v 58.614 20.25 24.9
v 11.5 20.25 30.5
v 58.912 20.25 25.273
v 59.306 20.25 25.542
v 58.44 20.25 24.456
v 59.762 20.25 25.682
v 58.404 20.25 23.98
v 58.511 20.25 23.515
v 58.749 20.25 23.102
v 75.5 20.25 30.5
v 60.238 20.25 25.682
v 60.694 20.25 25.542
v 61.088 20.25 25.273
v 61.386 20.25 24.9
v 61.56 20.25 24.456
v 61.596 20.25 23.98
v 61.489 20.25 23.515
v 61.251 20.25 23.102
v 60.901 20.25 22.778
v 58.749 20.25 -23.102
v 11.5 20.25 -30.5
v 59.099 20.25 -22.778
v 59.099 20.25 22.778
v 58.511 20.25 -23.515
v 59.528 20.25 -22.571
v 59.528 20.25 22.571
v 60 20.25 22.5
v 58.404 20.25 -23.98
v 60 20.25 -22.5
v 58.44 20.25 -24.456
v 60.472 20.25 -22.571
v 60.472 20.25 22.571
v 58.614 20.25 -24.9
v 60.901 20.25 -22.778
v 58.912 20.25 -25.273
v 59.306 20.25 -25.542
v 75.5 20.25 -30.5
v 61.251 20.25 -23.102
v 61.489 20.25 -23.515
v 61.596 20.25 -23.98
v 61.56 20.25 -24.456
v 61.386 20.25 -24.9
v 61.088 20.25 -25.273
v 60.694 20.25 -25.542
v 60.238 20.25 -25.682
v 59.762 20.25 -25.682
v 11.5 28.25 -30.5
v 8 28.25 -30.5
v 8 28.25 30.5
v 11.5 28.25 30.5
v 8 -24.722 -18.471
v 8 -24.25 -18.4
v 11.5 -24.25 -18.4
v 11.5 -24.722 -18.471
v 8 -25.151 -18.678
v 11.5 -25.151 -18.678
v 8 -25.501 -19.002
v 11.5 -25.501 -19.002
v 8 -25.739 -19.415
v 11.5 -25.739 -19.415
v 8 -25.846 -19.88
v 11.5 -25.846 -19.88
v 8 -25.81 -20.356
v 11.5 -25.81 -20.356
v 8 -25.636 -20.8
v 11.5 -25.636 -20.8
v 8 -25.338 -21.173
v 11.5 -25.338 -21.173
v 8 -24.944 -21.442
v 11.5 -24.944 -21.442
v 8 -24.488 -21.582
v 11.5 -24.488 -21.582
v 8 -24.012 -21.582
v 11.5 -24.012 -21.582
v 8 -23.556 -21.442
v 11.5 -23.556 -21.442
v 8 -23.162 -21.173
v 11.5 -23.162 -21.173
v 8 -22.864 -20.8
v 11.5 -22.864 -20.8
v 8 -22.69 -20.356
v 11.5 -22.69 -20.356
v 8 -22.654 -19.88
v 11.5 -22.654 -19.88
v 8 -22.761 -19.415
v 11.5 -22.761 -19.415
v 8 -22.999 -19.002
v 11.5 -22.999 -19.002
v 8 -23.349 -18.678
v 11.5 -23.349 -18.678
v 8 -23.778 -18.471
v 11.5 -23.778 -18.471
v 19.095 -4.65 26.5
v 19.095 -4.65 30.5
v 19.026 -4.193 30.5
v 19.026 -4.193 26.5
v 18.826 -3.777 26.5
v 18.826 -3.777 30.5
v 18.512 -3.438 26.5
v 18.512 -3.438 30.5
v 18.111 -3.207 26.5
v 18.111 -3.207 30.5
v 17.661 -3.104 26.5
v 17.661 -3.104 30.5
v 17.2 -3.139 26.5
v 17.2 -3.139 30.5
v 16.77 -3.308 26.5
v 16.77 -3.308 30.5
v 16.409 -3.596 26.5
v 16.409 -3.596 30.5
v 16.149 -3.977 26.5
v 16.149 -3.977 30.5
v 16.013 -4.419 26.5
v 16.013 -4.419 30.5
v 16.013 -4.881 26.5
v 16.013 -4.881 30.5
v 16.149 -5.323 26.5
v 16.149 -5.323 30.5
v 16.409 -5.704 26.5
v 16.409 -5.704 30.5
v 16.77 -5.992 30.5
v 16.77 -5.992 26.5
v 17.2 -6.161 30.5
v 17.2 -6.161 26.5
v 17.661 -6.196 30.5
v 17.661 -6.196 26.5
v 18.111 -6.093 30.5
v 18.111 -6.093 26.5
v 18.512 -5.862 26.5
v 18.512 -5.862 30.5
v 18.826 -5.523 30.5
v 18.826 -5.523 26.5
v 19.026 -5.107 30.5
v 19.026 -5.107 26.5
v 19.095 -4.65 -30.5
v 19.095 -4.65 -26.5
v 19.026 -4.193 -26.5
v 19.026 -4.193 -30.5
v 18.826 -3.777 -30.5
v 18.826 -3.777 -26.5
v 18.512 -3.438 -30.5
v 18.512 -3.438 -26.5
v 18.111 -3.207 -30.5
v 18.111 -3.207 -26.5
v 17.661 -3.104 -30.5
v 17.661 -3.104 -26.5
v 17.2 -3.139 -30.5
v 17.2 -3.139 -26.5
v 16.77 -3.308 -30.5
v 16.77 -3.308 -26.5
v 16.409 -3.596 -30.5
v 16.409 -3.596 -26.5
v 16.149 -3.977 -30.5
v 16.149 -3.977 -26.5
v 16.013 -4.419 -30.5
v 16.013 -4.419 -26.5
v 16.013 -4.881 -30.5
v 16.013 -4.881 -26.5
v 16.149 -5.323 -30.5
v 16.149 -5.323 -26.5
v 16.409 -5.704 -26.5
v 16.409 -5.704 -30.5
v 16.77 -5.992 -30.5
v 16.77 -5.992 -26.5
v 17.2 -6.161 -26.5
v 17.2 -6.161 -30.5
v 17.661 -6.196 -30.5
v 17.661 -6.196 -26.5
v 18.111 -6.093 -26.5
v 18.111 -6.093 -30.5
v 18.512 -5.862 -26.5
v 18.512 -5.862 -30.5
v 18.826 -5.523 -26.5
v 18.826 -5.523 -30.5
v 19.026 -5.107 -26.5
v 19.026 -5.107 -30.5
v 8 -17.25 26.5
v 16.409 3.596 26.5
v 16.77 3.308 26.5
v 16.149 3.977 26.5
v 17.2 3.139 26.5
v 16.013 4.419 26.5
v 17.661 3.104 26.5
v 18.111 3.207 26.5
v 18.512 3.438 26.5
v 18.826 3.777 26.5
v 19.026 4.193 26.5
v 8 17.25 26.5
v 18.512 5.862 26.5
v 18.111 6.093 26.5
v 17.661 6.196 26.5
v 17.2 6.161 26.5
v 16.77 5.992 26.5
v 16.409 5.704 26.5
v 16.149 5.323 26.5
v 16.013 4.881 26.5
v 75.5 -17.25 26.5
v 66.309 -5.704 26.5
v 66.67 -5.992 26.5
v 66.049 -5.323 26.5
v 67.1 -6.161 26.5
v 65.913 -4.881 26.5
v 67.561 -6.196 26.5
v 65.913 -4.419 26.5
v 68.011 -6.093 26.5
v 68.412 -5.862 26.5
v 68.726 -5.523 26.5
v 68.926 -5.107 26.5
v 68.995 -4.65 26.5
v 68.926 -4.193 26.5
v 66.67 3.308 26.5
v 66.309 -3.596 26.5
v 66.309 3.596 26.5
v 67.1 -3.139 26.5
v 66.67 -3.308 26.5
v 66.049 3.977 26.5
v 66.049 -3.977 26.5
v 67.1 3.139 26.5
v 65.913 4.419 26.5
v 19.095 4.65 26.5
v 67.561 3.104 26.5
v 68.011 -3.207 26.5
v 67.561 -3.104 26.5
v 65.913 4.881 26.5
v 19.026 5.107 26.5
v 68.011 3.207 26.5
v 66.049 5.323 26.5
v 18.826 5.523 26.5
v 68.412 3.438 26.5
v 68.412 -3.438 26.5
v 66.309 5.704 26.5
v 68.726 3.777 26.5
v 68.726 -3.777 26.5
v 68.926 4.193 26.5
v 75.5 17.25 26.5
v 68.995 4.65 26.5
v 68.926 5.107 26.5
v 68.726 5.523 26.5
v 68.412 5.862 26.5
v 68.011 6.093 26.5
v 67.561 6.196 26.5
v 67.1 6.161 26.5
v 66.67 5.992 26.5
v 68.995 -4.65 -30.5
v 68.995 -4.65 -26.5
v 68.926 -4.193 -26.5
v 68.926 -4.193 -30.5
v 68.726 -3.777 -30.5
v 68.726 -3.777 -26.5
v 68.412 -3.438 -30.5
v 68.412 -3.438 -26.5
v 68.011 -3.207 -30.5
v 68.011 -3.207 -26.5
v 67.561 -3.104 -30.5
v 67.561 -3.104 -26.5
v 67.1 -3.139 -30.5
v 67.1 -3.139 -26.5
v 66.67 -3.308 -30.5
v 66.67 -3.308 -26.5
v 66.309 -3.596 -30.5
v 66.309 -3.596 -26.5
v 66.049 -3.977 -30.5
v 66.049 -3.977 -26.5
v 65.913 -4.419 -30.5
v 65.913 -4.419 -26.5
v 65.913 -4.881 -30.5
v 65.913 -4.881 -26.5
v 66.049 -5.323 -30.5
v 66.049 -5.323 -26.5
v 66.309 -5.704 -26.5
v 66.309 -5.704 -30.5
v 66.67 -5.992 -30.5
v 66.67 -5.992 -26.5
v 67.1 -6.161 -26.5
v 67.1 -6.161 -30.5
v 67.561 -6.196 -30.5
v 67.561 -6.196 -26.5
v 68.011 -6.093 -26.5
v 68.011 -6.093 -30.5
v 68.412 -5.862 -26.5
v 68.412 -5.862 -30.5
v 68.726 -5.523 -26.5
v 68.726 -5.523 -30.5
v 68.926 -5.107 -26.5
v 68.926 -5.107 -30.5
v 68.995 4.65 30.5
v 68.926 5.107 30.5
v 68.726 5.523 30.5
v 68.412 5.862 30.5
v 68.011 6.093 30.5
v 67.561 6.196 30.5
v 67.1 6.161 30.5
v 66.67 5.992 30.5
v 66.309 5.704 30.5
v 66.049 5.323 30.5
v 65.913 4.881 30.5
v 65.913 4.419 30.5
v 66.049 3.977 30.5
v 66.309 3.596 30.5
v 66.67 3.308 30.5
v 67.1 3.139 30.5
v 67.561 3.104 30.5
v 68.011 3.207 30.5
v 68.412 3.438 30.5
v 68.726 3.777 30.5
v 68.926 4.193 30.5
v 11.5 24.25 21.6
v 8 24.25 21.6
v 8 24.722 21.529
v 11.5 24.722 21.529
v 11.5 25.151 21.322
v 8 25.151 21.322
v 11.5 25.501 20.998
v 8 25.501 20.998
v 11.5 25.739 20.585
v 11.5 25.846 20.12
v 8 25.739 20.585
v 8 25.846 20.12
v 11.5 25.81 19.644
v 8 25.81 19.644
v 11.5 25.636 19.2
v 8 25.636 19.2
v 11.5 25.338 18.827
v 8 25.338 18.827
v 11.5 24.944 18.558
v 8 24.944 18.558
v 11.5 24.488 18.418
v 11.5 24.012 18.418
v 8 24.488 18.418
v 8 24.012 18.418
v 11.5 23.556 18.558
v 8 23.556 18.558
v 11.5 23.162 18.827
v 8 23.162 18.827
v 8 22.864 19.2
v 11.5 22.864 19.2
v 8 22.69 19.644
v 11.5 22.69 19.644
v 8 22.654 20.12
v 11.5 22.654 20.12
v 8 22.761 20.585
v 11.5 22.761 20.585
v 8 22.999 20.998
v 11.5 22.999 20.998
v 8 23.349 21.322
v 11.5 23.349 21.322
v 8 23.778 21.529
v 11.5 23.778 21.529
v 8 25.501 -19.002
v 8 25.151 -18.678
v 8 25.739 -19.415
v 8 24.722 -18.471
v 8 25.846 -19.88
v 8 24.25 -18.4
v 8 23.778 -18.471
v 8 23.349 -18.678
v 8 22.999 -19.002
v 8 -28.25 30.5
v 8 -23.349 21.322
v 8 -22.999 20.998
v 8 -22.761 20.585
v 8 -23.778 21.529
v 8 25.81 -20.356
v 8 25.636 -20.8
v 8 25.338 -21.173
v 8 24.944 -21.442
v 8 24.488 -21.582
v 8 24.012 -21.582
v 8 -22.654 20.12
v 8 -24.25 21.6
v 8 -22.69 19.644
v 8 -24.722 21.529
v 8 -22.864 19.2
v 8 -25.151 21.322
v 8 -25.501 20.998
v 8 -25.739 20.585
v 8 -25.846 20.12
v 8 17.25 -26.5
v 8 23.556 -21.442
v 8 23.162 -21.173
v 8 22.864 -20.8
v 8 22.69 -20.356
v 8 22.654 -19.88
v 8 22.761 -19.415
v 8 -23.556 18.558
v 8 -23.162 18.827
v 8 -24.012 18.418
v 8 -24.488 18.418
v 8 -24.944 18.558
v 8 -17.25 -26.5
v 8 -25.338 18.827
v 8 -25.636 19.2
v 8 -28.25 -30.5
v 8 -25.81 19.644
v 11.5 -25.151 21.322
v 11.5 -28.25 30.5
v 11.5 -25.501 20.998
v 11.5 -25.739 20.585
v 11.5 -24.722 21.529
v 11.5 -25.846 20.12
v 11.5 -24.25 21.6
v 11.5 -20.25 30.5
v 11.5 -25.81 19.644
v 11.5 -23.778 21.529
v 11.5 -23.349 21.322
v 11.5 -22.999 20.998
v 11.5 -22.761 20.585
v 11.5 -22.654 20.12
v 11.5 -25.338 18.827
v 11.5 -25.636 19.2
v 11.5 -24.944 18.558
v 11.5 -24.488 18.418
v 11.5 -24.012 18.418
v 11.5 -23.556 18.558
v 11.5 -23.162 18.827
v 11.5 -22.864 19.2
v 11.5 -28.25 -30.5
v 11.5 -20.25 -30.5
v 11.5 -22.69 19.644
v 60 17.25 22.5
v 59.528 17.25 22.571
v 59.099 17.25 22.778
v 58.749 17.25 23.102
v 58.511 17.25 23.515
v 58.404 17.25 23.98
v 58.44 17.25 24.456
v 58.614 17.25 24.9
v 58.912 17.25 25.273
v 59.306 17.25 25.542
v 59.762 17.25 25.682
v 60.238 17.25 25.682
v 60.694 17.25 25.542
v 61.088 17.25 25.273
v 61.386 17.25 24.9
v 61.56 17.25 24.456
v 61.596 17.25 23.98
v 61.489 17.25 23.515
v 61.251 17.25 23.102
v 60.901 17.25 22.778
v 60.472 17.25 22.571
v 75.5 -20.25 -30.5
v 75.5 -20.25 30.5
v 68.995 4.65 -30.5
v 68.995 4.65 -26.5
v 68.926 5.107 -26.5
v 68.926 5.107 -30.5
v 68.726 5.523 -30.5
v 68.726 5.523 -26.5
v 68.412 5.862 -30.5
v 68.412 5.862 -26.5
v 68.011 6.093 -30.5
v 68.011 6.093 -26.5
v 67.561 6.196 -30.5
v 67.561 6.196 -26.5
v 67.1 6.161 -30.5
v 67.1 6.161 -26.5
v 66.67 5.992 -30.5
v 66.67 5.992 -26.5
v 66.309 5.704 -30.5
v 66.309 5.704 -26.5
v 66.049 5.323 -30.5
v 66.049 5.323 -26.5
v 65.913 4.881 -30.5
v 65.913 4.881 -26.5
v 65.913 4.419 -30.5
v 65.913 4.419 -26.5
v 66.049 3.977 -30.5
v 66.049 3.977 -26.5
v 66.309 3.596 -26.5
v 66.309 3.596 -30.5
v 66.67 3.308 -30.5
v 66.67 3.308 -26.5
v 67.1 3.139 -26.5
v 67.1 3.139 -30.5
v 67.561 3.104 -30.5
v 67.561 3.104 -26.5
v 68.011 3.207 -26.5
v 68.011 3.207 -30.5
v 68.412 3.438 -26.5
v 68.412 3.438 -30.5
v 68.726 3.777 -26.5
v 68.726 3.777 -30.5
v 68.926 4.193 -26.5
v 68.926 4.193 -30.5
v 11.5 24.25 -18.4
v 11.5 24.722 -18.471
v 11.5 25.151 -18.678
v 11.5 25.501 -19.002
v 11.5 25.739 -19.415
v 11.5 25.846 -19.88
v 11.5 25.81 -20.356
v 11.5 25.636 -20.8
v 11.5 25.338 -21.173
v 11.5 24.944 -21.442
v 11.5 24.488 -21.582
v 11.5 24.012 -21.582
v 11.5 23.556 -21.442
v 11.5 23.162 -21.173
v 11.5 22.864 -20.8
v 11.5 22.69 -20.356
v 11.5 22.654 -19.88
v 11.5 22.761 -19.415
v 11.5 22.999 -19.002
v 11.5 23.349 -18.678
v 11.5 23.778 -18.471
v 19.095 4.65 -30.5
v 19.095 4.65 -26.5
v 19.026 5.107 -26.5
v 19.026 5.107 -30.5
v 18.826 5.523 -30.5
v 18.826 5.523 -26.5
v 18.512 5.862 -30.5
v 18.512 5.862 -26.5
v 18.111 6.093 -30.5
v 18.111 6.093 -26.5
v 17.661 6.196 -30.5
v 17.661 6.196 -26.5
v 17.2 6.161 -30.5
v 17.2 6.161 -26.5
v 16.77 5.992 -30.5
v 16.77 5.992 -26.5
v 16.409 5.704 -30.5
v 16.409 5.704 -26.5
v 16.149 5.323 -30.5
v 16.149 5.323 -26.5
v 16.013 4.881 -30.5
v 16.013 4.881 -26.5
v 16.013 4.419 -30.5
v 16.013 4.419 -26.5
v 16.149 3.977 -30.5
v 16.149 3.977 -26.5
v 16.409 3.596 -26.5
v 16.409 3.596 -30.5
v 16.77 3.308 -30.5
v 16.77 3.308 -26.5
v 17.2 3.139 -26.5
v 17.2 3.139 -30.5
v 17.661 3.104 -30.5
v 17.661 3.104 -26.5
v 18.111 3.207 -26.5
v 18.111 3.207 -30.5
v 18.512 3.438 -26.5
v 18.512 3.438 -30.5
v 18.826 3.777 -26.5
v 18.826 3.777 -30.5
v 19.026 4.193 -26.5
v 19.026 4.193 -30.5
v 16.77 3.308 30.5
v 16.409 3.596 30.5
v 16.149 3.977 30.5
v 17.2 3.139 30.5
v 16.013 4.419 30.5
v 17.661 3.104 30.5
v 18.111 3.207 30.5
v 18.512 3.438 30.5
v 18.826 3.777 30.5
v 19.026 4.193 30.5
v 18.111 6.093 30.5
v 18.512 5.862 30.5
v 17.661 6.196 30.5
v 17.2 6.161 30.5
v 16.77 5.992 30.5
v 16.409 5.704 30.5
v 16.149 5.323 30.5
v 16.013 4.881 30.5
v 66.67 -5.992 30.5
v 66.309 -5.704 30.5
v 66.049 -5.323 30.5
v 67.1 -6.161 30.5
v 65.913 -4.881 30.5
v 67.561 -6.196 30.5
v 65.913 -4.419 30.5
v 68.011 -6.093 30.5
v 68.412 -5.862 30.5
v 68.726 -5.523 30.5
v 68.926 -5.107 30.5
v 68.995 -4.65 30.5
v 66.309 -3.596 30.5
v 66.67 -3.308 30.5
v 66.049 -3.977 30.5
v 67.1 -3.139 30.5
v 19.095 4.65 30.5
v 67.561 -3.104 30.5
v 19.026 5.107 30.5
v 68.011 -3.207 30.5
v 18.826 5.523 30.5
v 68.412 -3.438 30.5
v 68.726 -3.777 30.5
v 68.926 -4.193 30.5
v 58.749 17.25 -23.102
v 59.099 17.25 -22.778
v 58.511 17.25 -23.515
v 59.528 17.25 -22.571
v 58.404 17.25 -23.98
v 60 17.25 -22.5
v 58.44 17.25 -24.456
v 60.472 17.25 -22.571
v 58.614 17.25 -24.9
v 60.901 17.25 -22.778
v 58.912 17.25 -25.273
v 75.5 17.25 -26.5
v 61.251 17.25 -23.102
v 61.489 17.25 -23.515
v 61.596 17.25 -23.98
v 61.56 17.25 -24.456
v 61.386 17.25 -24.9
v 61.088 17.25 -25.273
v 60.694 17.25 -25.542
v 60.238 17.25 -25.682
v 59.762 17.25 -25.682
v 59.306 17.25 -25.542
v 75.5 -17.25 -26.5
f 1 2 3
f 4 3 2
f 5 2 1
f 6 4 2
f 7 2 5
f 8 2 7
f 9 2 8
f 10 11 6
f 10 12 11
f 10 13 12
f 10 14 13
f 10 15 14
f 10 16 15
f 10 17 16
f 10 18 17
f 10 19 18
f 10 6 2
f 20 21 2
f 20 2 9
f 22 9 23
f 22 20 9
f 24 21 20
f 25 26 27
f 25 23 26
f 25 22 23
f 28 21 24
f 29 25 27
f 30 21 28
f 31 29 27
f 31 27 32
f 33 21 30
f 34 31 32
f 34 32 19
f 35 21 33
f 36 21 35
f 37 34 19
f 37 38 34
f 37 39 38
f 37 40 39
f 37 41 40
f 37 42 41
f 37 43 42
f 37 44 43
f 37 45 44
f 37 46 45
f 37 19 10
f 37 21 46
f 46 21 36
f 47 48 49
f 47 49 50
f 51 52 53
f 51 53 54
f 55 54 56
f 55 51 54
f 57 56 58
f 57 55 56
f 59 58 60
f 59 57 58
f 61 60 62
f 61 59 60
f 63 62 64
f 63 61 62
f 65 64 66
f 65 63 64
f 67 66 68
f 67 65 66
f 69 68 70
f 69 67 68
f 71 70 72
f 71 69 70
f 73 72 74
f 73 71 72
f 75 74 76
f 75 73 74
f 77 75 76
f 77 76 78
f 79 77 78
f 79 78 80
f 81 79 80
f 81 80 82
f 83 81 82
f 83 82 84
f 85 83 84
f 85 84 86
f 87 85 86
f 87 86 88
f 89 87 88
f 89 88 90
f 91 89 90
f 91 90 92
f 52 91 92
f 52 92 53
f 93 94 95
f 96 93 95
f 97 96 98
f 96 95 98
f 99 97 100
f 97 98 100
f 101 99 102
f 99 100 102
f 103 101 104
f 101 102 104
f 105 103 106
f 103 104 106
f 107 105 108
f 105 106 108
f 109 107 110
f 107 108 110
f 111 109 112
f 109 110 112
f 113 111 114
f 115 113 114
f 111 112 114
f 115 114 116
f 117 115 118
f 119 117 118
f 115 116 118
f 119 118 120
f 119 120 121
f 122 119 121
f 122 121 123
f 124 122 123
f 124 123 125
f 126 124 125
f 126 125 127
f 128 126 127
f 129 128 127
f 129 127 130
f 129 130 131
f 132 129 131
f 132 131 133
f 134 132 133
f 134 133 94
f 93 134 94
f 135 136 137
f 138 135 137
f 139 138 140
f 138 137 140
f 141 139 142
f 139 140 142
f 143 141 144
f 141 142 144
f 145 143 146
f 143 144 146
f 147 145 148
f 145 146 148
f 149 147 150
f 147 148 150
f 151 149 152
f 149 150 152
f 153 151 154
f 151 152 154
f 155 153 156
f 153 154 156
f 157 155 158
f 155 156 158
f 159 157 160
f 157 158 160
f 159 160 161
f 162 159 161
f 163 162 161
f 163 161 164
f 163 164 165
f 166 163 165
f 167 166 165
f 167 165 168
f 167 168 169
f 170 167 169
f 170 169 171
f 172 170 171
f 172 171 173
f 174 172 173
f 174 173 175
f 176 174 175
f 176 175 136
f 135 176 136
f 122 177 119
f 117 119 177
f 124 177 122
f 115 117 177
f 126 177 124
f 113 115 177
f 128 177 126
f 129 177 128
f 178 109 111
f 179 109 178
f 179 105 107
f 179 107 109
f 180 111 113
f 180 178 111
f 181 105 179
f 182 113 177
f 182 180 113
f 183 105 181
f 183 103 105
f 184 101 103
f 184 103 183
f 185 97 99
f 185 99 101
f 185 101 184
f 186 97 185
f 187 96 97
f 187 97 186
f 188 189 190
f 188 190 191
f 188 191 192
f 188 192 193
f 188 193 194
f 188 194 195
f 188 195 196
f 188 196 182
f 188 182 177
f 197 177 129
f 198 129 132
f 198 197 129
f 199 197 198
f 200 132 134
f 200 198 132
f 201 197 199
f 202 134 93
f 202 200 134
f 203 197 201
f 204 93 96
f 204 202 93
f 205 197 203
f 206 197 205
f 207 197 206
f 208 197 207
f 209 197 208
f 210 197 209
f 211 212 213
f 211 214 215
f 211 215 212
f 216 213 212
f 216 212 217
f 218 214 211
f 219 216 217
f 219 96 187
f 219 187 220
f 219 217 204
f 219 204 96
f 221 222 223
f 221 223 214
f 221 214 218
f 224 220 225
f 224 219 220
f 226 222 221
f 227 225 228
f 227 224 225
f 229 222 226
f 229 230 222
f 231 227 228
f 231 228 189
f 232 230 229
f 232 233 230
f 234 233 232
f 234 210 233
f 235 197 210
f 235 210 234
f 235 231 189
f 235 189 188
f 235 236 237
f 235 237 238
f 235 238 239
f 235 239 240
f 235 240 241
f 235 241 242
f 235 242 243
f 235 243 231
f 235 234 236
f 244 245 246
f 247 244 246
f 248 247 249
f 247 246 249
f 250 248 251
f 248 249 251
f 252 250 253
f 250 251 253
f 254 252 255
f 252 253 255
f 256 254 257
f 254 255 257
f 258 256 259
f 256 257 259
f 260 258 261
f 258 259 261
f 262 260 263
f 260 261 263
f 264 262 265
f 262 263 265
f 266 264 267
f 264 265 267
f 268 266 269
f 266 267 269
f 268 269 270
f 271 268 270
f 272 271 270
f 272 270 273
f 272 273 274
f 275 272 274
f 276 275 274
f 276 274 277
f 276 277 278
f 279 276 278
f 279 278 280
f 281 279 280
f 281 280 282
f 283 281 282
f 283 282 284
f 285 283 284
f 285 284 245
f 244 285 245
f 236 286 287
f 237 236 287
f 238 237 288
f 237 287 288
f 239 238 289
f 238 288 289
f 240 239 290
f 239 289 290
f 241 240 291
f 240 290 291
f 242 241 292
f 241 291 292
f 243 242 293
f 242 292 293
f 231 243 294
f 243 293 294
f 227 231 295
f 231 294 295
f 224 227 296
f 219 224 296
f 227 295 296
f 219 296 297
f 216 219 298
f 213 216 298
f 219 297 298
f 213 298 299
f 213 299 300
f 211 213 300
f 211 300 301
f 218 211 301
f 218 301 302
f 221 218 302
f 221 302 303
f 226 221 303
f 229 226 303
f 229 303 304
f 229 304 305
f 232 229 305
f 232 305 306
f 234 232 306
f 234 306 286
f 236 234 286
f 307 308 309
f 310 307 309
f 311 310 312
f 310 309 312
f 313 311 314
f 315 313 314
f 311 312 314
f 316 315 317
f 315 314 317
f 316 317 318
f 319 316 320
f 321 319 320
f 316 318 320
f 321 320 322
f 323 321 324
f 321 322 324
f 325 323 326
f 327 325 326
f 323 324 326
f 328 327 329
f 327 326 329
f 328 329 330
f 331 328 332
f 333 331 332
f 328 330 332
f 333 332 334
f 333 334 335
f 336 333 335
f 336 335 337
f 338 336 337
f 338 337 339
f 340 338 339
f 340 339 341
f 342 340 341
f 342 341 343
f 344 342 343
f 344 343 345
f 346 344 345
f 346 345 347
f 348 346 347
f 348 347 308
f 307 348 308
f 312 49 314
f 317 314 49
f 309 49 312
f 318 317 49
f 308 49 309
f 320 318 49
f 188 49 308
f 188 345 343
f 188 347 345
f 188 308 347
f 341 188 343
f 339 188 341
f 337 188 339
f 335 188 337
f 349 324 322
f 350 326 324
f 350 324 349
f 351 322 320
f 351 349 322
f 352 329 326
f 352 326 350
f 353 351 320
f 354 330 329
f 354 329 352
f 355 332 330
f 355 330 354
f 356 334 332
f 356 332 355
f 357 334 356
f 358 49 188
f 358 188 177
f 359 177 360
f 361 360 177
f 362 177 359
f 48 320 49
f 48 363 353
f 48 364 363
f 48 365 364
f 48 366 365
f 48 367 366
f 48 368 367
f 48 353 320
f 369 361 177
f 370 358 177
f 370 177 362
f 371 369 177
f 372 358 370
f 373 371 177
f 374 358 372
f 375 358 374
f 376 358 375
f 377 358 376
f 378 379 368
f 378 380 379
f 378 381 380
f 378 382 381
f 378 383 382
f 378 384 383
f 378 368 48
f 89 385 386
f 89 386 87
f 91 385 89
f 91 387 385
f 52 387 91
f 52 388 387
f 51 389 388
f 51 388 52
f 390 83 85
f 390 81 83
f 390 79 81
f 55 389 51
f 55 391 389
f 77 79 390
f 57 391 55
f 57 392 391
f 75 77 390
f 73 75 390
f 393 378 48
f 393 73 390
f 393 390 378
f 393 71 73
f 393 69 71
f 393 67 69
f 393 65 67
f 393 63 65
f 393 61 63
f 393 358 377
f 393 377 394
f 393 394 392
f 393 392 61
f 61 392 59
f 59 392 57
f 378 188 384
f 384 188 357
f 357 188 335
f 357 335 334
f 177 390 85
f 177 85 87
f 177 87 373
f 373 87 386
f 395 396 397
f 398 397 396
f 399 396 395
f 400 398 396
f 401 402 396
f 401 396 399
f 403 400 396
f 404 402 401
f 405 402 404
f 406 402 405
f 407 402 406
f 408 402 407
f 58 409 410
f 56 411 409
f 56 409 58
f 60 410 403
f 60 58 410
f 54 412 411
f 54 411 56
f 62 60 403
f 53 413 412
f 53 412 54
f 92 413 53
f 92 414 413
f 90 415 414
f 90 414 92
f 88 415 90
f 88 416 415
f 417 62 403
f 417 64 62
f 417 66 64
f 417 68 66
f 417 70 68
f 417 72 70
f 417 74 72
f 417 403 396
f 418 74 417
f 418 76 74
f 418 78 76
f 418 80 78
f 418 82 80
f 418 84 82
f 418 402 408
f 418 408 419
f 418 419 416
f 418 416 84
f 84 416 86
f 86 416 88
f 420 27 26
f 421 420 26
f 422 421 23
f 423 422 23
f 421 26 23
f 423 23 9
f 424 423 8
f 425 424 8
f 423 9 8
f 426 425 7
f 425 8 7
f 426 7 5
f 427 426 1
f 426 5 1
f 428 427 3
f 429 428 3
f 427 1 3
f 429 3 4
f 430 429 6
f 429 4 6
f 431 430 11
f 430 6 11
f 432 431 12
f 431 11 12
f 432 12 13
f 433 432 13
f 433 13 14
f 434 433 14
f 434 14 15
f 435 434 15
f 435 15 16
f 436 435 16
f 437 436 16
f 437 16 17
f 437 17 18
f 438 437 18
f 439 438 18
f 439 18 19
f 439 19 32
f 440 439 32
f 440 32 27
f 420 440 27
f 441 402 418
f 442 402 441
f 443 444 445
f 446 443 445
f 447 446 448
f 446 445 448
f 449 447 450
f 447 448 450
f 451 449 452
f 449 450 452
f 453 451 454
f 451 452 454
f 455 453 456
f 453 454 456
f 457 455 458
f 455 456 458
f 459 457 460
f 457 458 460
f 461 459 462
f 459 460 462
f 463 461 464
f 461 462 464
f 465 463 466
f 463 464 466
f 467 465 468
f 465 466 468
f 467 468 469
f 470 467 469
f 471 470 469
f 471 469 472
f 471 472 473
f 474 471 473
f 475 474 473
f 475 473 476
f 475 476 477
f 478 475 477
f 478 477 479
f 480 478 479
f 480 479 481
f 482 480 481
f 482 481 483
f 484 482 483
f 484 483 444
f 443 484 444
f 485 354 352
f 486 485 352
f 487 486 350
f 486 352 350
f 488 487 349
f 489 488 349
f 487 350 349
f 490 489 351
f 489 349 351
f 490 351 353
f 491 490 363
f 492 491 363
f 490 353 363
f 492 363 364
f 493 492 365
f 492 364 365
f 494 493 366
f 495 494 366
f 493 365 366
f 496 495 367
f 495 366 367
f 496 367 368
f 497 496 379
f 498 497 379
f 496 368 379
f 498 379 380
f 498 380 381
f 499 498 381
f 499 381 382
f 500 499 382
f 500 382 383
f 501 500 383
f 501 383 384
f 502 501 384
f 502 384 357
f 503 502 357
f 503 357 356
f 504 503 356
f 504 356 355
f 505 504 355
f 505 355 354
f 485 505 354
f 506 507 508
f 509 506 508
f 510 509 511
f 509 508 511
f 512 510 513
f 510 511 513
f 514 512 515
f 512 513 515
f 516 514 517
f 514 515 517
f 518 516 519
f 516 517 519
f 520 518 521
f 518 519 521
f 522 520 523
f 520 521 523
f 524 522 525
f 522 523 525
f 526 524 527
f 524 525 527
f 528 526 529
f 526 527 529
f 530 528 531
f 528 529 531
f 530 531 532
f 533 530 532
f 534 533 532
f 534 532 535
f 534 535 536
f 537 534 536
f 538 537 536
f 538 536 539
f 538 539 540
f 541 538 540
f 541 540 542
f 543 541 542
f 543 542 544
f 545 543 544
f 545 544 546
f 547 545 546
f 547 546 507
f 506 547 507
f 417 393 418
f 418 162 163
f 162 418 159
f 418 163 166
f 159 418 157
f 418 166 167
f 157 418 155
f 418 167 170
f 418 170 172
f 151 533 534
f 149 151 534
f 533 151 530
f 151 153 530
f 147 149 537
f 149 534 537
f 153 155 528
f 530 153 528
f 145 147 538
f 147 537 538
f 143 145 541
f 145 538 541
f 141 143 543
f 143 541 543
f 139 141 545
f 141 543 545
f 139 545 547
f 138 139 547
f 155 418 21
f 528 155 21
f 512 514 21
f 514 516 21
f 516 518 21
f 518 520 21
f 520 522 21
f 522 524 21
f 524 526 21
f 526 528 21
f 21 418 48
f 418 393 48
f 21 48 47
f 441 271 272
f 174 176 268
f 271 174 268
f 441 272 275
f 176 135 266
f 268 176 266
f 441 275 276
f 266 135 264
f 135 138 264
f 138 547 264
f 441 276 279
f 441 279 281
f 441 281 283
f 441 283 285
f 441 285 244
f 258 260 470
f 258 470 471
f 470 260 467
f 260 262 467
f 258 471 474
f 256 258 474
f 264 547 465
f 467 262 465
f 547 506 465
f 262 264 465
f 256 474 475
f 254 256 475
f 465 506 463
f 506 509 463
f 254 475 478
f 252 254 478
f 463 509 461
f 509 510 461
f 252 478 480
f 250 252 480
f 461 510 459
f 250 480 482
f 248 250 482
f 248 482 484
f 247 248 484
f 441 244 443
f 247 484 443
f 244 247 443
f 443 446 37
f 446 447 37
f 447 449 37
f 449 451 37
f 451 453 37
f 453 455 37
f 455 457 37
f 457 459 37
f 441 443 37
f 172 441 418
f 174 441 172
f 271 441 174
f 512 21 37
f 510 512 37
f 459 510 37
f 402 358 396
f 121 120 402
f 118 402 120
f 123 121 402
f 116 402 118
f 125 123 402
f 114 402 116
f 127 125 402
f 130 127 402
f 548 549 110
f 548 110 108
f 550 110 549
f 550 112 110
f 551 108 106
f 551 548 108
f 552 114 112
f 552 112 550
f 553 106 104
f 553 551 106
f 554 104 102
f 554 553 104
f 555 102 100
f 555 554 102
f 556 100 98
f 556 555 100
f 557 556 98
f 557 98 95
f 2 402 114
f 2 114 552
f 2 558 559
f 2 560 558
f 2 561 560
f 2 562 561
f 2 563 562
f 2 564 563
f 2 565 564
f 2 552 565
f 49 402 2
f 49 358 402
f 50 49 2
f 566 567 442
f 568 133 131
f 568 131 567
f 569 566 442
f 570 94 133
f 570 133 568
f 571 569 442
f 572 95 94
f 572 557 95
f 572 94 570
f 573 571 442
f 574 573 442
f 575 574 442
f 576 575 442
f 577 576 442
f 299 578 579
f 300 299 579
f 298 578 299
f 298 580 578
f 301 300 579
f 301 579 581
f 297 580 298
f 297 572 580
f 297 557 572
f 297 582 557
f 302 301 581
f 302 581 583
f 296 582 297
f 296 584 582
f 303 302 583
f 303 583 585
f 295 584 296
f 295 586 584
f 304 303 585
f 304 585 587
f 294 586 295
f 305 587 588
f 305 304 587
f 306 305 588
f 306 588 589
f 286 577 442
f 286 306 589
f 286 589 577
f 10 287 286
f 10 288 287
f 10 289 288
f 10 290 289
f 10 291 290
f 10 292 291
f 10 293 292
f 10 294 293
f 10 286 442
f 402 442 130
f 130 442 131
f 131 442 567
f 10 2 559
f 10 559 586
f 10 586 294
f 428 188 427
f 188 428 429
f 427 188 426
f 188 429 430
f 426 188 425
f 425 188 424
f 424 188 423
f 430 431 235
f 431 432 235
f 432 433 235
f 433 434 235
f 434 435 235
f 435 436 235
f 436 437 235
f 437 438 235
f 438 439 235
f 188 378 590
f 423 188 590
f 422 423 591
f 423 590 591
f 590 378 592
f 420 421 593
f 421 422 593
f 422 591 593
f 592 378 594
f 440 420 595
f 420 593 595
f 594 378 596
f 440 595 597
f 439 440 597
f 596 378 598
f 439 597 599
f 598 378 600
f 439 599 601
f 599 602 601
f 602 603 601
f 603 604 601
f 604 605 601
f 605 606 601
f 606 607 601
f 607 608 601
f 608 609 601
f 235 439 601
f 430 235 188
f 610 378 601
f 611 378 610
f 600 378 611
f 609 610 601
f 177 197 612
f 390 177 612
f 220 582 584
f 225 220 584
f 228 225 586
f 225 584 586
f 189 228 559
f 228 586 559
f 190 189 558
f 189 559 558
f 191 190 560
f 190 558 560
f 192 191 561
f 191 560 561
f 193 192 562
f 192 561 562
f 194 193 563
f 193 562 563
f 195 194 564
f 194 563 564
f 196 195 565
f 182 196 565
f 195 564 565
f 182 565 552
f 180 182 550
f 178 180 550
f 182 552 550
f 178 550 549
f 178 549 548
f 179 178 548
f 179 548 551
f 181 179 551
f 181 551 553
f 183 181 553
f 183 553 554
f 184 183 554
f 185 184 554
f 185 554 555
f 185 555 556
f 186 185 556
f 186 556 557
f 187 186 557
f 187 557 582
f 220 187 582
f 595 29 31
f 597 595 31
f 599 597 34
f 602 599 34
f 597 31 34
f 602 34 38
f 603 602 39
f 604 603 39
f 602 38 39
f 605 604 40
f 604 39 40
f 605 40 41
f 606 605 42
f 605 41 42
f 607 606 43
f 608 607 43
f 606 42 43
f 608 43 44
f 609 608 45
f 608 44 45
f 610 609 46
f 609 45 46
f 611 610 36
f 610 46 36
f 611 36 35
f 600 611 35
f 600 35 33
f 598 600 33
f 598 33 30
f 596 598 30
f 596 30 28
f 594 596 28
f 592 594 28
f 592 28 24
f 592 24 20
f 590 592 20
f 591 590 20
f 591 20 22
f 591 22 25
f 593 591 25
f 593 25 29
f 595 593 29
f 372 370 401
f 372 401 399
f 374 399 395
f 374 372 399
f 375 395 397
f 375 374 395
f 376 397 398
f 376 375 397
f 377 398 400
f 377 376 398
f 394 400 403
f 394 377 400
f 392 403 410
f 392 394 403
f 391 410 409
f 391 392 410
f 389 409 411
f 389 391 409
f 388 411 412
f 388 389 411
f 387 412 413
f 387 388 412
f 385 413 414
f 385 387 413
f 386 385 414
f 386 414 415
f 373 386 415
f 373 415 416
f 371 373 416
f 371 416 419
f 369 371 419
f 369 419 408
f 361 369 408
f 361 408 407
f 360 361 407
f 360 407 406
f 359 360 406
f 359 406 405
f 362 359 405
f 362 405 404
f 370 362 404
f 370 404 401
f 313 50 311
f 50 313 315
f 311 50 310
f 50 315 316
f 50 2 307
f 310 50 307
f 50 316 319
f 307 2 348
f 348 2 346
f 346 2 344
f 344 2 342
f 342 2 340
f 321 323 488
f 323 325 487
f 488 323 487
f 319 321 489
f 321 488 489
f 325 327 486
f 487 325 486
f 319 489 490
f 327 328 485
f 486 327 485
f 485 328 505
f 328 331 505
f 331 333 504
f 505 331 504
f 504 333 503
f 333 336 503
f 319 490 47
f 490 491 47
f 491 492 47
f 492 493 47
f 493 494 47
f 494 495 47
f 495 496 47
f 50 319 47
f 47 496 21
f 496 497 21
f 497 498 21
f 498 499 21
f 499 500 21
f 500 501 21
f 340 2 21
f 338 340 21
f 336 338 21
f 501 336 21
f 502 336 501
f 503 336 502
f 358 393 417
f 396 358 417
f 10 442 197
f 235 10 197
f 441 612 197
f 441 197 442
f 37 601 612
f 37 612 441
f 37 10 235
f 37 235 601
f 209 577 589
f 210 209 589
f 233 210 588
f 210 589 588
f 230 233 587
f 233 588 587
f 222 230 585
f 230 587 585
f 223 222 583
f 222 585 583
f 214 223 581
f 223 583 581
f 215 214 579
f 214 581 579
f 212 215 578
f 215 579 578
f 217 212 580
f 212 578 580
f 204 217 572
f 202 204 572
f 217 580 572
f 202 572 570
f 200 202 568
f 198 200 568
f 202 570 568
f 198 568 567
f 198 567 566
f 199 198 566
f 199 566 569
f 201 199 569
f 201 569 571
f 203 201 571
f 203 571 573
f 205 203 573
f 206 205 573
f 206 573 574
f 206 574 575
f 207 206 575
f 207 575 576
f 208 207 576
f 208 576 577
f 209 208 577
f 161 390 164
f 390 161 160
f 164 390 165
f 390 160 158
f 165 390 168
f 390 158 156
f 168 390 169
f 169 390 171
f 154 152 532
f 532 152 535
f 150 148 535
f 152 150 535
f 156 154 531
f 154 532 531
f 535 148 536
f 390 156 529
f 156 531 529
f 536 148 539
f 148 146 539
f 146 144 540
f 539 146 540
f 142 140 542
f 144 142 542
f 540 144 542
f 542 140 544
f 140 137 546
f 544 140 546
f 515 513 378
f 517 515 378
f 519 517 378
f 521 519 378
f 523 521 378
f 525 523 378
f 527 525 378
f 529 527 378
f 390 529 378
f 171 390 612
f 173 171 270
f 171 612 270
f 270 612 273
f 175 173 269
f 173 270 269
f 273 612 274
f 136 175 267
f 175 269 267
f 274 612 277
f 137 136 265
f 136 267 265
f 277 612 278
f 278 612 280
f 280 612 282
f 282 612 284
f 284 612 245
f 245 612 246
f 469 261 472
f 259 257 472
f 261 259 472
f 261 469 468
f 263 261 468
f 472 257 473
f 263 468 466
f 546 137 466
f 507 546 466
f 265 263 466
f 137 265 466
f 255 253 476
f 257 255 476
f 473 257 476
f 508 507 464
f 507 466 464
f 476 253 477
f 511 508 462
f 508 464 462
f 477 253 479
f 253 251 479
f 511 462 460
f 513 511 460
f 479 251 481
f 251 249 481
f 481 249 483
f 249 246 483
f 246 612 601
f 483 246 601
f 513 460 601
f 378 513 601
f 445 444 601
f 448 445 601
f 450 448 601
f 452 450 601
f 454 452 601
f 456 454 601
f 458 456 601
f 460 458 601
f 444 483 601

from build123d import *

# Parameters (mm, degrees)
SKETCH1_W                = 151
SKETCH1_H                = 61
SKETCH1_W_2              = 143
SKETCH1_H_2              = 53
BOSS_EXTRUDE1_DEPTH      = 20.25
SKETCH2_W                = 143
SKETCH2_H                = 53
BOSS_EXTRUDE2_DEPTH      = 3
SKETCH7_W                = 53
SKETCH7_H                = 37.5
CUT_EXTRUDE3_DEPTH       = 4
SKETCH9_W                = 147
SKETCH9_H                = 53
BOSS_EXTRUDE3_DEPTH      = 3
CUT_EXTRUDE4_REACH       = 92.944
SKETCH10_R               = 1.6
SKETCH12_R               = 1.55
CUT_EXTRUDE6_DEPTH       = 100.152975245
SKETCH13_W               = 7
SKETCH13_H               = 19.36
BOSS_EXTRUDE4_DEPTH      = 2
SKETCH16_R               = 1.6
CUT_EXTRUDE7_DEPTH       = 10
SKETCH17_W               = 7
SKETCH17_H               = 15
SKETCH17_R               = 2
BOSS_EXTRUDE5_DEPTH      = 3
SKETCH18_R               = 1.6
CUT_EXTRUDE8_DEPTH       = 10
SKETCH19_W               = 25
SKETCH19_H               = 12
CUT_EXTRUDE9_DEPTH       = 105.834164756
SKETCH20_W               = 7
SKETCH20_H               = 61
BOSS_EXTRUDE6_DEPTH      = 8
CUT_EXTRUDE10_REACH      = 96.336
SKETCH21_R               = 1.6
CUT_EXTRUDE11_DEPTH      = 91.550826059
CUT_EXTRUDE11_DEPTH_BACK = 91.550826059
SKETCH22_W               = 90.903507757
SKETCH22_H               = 73.955491088


with BuildPart() as part:
    # Sketch1 → Boss-Extrude1 (new, symmetric)
    with BuildSketch(Plane(origin=(0, 0, 0), x_dir=(1, 0, 0), z_dir=(0, 1, 0))):
        Rectangle(SKETCH1_W, SKETCH1_H)
        Rectangle(SKETCH1_W_2, SKETCH1_H_2, mode=Mode.SUBTRACT)
    extrude(amount=BOSS_EXTRUDE1_DEPTH, both=True)

    # Sketch2 → Boss-Extrude2 (add)
    with BuildSketch(Plane.XZ.offset(20.25)):
        Rectangle(SKETCH2_W, SKETCH2_H)
    extrude(amount=-BOSS_EXTRUDE2_DEPTH)

    # Sketch7 → Cut-Extrude3 (cut)
    with BuildSketch(Plane(origin=(75.5, 0, 0), x_dir=(0, 0, -1), z_dir=(1, 0, 0))):
        with Locations((0, 1.5)):
            Rectangle(SKETCH7_W, SKETCH7_H)
    extrude(amount=-CUT_EXTRUDE3_DEPTH, mode=Mode.SUBTRACT)

    # Sketch9 → Boss-Extrude3 (add)
    with BuildSketch(Plane(origin=(0, 20.25, 0), x_dir=(1, 0, 0), z_dir=(0, 1, 0))):
        with Locations((2, 0)):
            Rectangle(SKETCH9_W, SKETCH9_H)
    extrude(amount=-BOSS_EXTRUDE3_DEPTH)

    # Sketch10 → Cut-Extrude4 (cut, up to next)
    with BuildSketch(Plane(origin=(0, 20.25, 0), x_dir=(1, 0, 0), z_dir=(0, 1, 0)), mode=Mode.PRIVATE) as cut_extrude4_sk1:
        with Locations(Location((60, 24.1, 0), (0, 0, 270))):
            Circle(SKETCH10_R)
    cut_extrude4_tool1 = extrude(cut_extrude4_sk1.sketch, amount=-CUT_EXTRUDE4_REACH, mode=Mode.PRIVATE) & part.part
    # Sketch10 → Cut-Extrude4 (cut, up to next)
    with BuildSketch(Plane(origin=(0, 20.25, 0), x_dir=(1, 0, 0), z_dir=(0, 1, 0)), mode=Mode.PRIVATE) as cut_extrude4_sk2:
        with Locations(Location((60, -24.1, 0), (0, 0, 90))):
            Circle(SKETCH10_R)
    cut_extrude4_tool2 = extrude(cut_extrude4_sk2.sketch, amount=-CUT_EXTRUDE4_REACH, mode=Mode.PRIVATE) & part.part
    # Sketch10 → Cut-Extrude4 (cut, up to next)
    with BuildSketch(Plane(origin=(0, 20.25, 0), x_dir=(1, 0, 0), z_dir=(0, 1, 0)), mode=Mode.PRIVATE) as cut_extrude4_sk3:
        with Locations(Location((-6.04, 21, 0), (0, 0, 270))):
            Circle(SKETCH10_R)
    cut_extrude4_tool3 = extrude(cut_extrude4_sk3.sketch, amount=-CUT_EXTRUDE4_REACH, mode=Mode.PRIVATE) & part.part
    # Sketch10 → Cut-Extrude4 (cut, up to next)
    with BuildSketch(Plane(origin=(0, 20.25, 0), x_dir=(1, 0, 0), z_dir=(0, 1, 0)), mode=Mode.PRIVATE) as cut_extrude4_sk4:
        with Locations(Location((-6.04, -21, 0), (0, 0, 90))):
            Circle(SKETCH10_R)
    cut_extrude4_tool4 = extrude(cut_extrude4_sk4.sketch, amount=-CUT_EXTRUDE4_REACH, mode=Mode.PRIVATE) & part.part
    add(cut_extrude4_tool1.solids().sort_by_distance((60, 20.25, -24.1))[0], mode=Mode.SUBTRACT)
    add(cut_extrude4_tool2.solids().sort_by_distance((60, 20.25, 24.1))[0], mode=Mode.SUBTRACT)
    add(cut_extrude4_tool3.solids().sort_by_distance((-6.04, 20.25, -21))[0], mode=Mode.SUBTRACT)
    add(cut_extrude4_tool4.solids().sort_by_distance((-6.04, 20.25, 21))[0], mode=Mode.SUBTRACT)

    # Sketch12 → Cut-Extrude6 (cut, through all)
    with BuildSketch(Plane.XY.offset(30.5)):
        with Locations((67.445205237, 4.65)):
            Circle(SKETCH12_R)
        with Locations((67.445205237, -4.65)):
            Circle(SKETCH12_R)
        with Locations((17.545205237, 4.65)):
            Circle(SKETCH12_R)
        with Locations((17.545205237, -4.65)):
            Circle(SKETCH12_R)
    extrude(amount=-CUT_EXTRUDE6_DEPTH, mode=Mode.SUBTRACT)

    # Sketch13 → Boss-Extrude4 (add)
    with BuildSketch(Plane.XY.offset(17)):
        with Locations((-69.37, 29.93)):
            Rectangle(SKETCH13_W, SKETCH13_H)
    boss_extrude4 = extrude(amount=BOSS_EXTRUDE4_DEPTH)

    # Sketch16 → Cut-Extrude7 (cut)
    with BuildSketch(Plane.XY.offset(19)):
        with Locations((-69.262241782, 24.85)):
            Circle(SKETCH16_R)
        with Locations((-69.262241782, 34.85)):
            Circle(SKETCH16_R)
    cut_extrude7 = extrude(amount=-CUT_EXTRUDE7_DEPTH, mode=Mode.SUBTRACT)

    # Mirror1: Boss-Extrude4, Cut-Extrude7 across plane
    add(boss_extrude4.mirror(Plane(origin=(-44.87, 0, 0), x_dir=(0, 0, 1), z_dir=(1, 0, 0))))
    add(cut_extrude7.mirror(Plane(origin=(-44.87, 0, 0), x_dir=(0, 0, 1), z_dir=(1, 0, 0))), mode=Mode.SUBTRACT)

    # Sketch17 → Boss-Extrude5 (add)
    with BuildSketch(Plane(origin=(0, 0, -30.5), x_dir=(-1, 0, 0), z_dir=(0, 0, -1))):
        with Locations((55.31, 27.75)):
            Rectangle(SKETCH17_W, SKETCH17_H)
        with Locations((55.31, 30.15)):
            Circle(SKETCH17_R, mode=Mode.SUBTRACT)
    extrude(amount=-BOSS_EXTRUDE5_DEPTH)

    # Sketch18 → Cut-Extrude8 (cut)
    with BuildSketch(Plane.XZ.offset(20.25)):
        with Locations(Location((-56.5, 20, 0), (0, 0, 270))):
            Circle(SKETCH18_R)
        with Locations(Location((-56.5, -20, 0), (0, 0, 270))):
            Circle(SKETCH18_R)
    extrude(amount=-CUT_EXTRUDE8_DEPTH, mode=Mode.SUBTRACT)

    # Sketch19 → Cut-Extrude9 (cut, through all)
    with BuildSketch(Plane.XY.offset(30.5)):
        with Locations((-56, -11.25)):
            Rectangle(SKETCH19_W, SKETCH19_H)
    extrude(amount=-CUT_EXTRUDE9_DEPTH, mode=Mode.SUBTRACT)

    # Sketch20 → Boss-Extrude6 (add)
    with BuildSketch(Plane(origin=(0, 20.25, 0), x_dir=(1, 0, 0), z_dir=(0, 1, 0))):
        with Locations((8, 0)):
            Rectangle(SKETCH20_W, SKETCH20_H)
    boss_extrude6 = extrude(amount=BOSS_EXTRUDE6_DEPTH)

    # Sketch21 → Cut-Extrude10 (cut, up to next)
    with BuildSketch(Plane.ZY.offset(-4.5), mode=Mode.PRIVATE) as cut_extrude10_sk1:
        with Locations((-20, 24.25)):
            Circle(SKETCH21_R)
    cut_extrude10_tool1 = extrude(cut_extrude10_sk1.sketch, amount=-CUT_EXTRUDE10_REACH, mode=Mode.PRIVATE) & part.part
    # Sketch21 → Cut-Extrude10 (cut, up to next)
    with BuildSketch(Plane.ZY.offset(-4.5), mode=Mode.PRIVATE) as cut_extrude10_sk2:
        with Locations((20, 24.25)):
            Circle(SKETCH21_R)
    cut_extrude10_tool2 = extrude(cut_extrude10_sk2.sketch, amount=-CUT_EXTRUDE10_REACH, mode=Mode.PRIVATE) & part.part
    cut_extrude10_1 = cut_extrude10_tool1.solids().sort_by_distance((4.5, 24.25, -20))[0]
    add(cut_extrude10_1, mode=Mode.SUBTRACT)
    cut_extrude10_2 = cut_extrude10_tool2.solids().sort_by_distance((4.5, 24.25, 20))[0]
    add(cut_extrude10_2, mode=Mode.SUBTRACT)
    cut_extrude10 = cut_extrude10_1 + cut_extrude10_2  # Cut-Extrude10 as one shape, for the pattern or mirror that repeats it

    # Mirror2: Boss-Extrude6, Cut-Extrude10 across plane
    add(boss_extrude6.mirror(Plane.ZX))
    add(cut_extrude10.mirror(Plane.ZX), mode=Mode.SUBTRACT)

    # Sketch22 → Cut-Extrude11 (cut, two sides: drawn at the far end of the back side and taken through both)
    with BuildSketch(Plane(origin=(0, 0, 0), x_dir=(1, 0, 0), z_dir=(0, 1, 0)).offset(-CUT_EXTRUDE11_DEPTH_BACK)):
        with Locations((-37.451753878, 4.7681e-05)):
            Rectangle(SKETCH22_W, SKETCH22_H)
    extrude(amount=CUT_EXTRUDE11_DEPTH + CUT_EXTRUDE11_DEPTH_BACK, mode=Mode.SUBTRACT)


solid = part.part
